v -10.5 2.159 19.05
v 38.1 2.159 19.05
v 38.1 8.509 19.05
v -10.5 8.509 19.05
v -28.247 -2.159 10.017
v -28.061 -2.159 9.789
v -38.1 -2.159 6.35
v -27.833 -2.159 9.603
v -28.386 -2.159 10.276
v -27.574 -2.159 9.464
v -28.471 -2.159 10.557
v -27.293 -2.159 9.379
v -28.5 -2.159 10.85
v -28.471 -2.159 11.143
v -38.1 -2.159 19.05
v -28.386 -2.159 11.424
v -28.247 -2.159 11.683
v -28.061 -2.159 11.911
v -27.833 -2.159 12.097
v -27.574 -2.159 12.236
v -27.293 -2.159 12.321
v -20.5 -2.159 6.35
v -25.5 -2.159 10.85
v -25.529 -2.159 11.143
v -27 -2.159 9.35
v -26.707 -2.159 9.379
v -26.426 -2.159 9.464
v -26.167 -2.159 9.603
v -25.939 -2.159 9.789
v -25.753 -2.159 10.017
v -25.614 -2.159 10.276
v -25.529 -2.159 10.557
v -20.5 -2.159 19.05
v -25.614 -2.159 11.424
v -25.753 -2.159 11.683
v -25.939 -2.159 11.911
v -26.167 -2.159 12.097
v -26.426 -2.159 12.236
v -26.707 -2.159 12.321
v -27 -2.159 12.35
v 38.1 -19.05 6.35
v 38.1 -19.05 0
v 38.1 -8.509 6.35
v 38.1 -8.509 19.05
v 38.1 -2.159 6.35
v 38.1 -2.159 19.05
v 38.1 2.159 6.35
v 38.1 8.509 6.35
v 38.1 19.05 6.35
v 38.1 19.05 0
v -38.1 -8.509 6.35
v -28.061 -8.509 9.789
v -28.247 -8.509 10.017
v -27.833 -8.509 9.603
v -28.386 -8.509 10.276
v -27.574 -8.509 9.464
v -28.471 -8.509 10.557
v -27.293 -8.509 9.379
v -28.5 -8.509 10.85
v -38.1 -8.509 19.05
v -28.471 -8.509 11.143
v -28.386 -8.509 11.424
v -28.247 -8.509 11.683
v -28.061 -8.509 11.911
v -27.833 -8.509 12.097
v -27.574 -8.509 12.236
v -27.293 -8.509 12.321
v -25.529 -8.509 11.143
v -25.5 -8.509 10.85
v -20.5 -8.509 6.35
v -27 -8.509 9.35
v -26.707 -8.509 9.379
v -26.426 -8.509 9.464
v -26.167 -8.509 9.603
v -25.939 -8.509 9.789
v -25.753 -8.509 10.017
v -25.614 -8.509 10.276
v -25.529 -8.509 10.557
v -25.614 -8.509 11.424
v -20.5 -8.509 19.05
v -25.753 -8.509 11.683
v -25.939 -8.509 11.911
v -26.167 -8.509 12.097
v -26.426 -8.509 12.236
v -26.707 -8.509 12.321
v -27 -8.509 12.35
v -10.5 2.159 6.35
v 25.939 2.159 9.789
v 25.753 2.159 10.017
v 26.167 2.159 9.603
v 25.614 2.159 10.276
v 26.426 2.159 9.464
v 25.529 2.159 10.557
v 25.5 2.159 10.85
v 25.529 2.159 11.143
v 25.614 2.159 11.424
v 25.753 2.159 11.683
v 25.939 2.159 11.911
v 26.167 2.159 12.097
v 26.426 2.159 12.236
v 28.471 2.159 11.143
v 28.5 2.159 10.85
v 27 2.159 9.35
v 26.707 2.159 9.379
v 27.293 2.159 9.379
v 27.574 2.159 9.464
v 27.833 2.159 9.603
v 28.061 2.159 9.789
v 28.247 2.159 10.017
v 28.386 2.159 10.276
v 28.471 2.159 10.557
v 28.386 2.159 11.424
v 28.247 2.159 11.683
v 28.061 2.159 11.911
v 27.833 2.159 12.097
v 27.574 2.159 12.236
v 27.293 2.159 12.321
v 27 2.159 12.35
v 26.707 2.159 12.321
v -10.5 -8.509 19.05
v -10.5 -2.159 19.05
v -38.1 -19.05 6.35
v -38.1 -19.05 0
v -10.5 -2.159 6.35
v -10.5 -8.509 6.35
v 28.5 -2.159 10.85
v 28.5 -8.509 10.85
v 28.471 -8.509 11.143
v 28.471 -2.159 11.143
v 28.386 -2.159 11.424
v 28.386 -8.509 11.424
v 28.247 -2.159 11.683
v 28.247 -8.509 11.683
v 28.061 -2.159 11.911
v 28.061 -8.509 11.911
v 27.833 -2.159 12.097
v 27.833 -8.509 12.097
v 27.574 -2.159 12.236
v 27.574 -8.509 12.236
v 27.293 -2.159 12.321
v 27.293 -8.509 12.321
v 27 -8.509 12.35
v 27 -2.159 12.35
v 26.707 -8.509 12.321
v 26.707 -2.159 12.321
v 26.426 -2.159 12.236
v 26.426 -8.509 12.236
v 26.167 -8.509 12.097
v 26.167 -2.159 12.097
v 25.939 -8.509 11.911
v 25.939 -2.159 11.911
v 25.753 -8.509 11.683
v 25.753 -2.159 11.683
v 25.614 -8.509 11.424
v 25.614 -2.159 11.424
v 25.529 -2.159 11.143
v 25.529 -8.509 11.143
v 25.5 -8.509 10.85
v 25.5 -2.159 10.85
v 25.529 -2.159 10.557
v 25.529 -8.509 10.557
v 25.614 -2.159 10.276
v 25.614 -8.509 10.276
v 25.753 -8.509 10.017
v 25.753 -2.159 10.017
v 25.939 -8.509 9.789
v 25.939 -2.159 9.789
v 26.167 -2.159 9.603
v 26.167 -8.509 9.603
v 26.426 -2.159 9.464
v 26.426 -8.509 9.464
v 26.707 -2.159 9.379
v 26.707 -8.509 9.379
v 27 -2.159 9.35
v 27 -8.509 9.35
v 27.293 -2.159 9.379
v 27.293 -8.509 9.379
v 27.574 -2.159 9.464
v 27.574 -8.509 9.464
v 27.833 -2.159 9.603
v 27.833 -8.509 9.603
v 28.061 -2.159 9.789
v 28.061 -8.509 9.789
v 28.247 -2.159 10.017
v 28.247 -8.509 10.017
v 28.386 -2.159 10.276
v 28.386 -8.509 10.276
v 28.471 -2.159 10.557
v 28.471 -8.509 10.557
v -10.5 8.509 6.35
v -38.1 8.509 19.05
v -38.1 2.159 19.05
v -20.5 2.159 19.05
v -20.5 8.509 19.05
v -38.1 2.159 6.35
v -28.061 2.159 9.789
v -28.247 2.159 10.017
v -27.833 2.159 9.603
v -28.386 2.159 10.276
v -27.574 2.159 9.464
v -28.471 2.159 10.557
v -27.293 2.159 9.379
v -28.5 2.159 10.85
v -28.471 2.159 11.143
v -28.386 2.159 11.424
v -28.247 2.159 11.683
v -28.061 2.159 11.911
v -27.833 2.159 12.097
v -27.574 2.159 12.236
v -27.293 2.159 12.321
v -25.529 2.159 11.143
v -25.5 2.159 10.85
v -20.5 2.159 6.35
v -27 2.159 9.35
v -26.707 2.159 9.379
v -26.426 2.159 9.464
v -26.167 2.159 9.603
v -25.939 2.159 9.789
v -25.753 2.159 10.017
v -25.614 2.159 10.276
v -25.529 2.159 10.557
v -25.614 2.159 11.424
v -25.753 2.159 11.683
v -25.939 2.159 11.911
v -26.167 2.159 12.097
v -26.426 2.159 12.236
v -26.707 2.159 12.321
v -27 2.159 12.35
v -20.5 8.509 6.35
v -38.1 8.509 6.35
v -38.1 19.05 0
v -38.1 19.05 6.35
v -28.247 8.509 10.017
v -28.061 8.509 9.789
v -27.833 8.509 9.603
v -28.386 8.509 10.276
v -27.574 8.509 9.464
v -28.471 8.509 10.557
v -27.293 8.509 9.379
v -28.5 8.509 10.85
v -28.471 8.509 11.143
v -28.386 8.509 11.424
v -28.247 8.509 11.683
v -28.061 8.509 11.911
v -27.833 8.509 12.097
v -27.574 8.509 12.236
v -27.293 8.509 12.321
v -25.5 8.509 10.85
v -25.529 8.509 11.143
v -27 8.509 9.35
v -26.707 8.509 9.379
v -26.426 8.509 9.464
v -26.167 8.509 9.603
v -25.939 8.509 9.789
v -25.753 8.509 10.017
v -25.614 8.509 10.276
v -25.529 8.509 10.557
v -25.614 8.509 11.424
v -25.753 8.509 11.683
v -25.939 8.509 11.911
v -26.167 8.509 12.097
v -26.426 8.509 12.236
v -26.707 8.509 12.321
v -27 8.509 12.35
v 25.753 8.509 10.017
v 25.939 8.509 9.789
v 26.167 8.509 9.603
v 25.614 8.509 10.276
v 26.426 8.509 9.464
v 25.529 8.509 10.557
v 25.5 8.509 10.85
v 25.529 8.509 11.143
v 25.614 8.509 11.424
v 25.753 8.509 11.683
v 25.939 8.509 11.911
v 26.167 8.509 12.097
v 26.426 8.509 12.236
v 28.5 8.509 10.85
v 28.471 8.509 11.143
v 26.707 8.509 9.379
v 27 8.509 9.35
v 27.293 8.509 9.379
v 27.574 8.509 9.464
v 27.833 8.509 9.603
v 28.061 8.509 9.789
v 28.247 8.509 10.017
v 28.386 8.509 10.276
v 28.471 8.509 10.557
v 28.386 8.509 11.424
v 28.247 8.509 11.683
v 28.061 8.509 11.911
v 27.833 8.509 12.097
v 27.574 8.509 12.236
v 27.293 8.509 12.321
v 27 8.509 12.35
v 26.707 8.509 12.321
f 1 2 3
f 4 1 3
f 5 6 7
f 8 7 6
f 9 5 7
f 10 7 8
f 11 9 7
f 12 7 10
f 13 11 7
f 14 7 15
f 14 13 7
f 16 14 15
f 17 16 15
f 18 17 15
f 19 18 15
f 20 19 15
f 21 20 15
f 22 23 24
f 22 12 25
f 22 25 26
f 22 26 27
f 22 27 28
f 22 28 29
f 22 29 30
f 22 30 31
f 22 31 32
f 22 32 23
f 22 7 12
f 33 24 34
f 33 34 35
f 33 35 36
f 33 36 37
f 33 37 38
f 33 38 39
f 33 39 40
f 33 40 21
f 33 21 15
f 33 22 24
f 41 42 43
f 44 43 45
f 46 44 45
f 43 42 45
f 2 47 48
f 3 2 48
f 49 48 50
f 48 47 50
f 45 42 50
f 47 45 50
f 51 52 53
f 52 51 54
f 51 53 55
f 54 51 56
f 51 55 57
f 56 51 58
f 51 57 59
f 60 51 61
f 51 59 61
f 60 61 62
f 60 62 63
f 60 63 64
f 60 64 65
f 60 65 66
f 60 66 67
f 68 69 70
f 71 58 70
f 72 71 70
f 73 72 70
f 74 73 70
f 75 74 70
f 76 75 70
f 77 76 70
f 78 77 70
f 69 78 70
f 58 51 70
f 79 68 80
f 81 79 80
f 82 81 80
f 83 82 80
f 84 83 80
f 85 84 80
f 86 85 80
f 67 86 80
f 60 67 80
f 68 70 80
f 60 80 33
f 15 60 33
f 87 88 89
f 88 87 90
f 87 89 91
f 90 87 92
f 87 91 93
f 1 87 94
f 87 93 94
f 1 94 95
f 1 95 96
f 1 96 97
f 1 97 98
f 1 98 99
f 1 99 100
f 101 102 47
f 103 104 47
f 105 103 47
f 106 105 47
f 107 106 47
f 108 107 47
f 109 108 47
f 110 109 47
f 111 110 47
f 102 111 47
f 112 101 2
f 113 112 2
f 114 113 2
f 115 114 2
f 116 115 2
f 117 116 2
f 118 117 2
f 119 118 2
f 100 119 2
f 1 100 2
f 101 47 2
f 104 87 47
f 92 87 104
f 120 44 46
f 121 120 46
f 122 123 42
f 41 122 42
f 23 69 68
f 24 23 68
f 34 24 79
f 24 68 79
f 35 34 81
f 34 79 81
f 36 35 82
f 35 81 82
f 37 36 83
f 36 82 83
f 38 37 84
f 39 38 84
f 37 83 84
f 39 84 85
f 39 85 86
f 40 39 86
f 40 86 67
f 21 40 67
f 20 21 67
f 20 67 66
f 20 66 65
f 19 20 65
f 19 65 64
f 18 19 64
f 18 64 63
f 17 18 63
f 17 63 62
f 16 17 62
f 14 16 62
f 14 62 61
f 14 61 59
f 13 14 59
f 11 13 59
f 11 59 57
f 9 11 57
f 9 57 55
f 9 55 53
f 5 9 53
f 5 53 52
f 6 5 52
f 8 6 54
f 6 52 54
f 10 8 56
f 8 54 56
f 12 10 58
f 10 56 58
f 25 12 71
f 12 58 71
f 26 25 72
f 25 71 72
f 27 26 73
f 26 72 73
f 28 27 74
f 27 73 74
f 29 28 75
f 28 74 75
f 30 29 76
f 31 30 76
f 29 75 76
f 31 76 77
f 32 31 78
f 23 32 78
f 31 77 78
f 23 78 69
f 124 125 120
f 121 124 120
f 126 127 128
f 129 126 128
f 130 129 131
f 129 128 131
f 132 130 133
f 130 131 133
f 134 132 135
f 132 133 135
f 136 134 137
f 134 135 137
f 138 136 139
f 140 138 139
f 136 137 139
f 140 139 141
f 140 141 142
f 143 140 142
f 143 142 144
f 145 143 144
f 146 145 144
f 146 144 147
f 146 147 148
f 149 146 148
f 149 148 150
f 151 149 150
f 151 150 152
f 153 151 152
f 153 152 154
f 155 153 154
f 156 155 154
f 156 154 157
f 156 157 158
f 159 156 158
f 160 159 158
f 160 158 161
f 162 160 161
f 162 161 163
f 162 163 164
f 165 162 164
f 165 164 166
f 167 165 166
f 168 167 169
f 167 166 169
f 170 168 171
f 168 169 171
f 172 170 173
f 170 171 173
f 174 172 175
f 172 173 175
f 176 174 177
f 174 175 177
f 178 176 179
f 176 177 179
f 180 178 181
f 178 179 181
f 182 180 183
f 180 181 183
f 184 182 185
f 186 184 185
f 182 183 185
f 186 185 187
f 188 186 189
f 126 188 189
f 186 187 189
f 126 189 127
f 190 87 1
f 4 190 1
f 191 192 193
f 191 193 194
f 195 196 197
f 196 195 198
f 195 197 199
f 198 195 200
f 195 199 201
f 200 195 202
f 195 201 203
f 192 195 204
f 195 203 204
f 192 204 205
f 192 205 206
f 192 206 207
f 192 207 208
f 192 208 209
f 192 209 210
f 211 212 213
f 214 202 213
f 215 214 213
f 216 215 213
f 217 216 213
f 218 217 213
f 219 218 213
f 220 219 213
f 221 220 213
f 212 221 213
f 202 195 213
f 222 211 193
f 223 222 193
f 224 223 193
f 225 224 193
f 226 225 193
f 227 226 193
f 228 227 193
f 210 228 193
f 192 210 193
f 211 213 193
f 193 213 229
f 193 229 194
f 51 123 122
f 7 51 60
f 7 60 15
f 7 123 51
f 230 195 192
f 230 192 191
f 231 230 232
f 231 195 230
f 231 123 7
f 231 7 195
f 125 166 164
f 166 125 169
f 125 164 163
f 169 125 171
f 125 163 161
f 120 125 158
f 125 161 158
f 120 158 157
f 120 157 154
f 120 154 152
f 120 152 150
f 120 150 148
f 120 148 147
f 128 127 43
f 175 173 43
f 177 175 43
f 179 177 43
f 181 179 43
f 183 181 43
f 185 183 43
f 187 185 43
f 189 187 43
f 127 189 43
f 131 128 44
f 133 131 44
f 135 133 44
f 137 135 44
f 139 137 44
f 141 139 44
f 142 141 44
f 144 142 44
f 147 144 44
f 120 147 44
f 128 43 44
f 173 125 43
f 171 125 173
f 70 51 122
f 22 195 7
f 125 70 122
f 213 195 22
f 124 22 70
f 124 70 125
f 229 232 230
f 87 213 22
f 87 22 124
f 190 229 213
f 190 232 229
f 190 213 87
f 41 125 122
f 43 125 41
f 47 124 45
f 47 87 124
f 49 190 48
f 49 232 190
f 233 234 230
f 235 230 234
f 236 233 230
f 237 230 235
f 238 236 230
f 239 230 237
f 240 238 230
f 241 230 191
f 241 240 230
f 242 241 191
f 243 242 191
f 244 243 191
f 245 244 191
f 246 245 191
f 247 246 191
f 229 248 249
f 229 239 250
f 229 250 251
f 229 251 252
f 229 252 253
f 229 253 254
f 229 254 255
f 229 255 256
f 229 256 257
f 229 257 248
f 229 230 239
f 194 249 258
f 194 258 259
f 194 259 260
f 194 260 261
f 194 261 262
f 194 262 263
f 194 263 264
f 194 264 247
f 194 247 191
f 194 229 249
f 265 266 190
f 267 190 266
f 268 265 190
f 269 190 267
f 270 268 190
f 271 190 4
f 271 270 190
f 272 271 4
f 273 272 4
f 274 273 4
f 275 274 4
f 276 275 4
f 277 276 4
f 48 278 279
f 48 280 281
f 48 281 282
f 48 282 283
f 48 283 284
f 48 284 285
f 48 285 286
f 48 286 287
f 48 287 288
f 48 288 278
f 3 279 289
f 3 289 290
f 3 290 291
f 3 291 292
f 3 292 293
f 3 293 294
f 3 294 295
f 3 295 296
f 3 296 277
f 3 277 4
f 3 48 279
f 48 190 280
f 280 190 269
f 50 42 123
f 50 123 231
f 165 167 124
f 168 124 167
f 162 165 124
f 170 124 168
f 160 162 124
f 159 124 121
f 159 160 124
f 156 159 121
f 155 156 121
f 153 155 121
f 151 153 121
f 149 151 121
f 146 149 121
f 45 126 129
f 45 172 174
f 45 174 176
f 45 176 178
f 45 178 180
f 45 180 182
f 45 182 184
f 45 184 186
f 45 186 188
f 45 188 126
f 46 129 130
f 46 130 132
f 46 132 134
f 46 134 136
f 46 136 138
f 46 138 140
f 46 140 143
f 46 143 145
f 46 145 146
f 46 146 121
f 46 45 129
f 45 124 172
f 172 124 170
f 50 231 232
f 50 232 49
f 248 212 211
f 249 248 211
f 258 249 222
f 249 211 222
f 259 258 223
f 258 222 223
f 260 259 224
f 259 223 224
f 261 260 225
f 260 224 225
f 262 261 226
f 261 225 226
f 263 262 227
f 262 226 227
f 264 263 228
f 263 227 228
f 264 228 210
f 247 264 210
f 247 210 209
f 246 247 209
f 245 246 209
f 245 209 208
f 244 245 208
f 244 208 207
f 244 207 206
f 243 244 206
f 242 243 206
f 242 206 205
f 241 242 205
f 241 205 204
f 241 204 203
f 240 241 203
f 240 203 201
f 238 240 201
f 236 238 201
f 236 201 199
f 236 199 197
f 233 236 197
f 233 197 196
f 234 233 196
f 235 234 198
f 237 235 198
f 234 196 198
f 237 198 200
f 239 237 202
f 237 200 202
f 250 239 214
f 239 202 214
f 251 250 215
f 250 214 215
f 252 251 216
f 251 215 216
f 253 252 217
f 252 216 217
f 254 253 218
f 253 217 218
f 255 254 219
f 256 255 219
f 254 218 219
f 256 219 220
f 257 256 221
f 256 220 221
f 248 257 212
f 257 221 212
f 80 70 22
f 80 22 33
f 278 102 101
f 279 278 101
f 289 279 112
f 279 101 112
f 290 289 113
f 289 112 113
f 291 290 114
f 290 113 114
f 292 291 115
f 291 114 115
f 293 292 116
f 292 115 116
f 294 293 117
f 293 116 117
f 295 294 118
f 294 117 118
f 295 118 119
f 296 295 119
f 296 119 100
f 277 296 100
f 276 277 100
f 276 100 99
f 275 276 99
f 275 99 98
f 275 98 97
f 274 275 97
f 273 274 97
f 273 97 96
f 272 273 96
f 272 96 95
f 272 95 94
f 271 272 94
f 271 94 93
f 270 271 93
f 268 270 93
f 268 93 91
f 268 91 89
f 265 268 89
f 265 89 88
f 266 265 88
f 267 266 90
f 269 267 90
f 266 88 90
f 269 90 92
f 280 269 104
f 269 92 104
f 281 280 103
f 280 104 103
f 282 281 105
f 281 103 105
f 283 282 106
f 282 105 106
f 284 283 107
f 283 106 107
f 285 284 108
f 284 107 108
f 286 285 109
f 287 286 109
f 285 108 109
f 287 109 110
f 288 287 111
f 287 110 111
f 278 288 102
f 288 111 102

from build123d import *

# Parameters (mm, degrees)
F0_W     = 76.2
F0_H     = 38.1
F1_DEPTH = 6.35
F2_W     = 6.35
F2_H     = 19.05
F3_DEPTH = 76.2
F4_R     = 1.5
F4_W     = 10
F4_H     = 12.7
F5_DEPTH = 17.018


with BuildPart() as f1:
    # F0 (on Top) → F1 (new body)
    with BuildSketch(Plane.XY):
        Rectangle(F0_W, F0_H)
    extrude(amount=F1_DEPTH)

    # F2 (on face) → F3 (join, through all)
    with BuildSketch(Plane.YZ.offset(38.1)):
        with Locations((-5.334, 9.525)):
            Rectangle(F2_W, F2_H)
        with Locations((5.334, 9.525)):
            Rectangle(F2_W, F2_H)
    extrude(amount=-F3_DEPTH)

    # F4 (on face) → F5 (cut, through all)
    with BuildSketch(Plane.XZ.offset(8.509)):
        with Locations((-27, 10.85)):
            Circle(F4_R)
        with Locations((27, 10.85)):
            Circle(F4_R)
        with Locations((-15.5, 12.7)):
            Rectangle(F4_W, F4_H)
    extrude(amount=-F5_DEPTH, mode=Mode.SUBTRACT)


solid = f1.part
